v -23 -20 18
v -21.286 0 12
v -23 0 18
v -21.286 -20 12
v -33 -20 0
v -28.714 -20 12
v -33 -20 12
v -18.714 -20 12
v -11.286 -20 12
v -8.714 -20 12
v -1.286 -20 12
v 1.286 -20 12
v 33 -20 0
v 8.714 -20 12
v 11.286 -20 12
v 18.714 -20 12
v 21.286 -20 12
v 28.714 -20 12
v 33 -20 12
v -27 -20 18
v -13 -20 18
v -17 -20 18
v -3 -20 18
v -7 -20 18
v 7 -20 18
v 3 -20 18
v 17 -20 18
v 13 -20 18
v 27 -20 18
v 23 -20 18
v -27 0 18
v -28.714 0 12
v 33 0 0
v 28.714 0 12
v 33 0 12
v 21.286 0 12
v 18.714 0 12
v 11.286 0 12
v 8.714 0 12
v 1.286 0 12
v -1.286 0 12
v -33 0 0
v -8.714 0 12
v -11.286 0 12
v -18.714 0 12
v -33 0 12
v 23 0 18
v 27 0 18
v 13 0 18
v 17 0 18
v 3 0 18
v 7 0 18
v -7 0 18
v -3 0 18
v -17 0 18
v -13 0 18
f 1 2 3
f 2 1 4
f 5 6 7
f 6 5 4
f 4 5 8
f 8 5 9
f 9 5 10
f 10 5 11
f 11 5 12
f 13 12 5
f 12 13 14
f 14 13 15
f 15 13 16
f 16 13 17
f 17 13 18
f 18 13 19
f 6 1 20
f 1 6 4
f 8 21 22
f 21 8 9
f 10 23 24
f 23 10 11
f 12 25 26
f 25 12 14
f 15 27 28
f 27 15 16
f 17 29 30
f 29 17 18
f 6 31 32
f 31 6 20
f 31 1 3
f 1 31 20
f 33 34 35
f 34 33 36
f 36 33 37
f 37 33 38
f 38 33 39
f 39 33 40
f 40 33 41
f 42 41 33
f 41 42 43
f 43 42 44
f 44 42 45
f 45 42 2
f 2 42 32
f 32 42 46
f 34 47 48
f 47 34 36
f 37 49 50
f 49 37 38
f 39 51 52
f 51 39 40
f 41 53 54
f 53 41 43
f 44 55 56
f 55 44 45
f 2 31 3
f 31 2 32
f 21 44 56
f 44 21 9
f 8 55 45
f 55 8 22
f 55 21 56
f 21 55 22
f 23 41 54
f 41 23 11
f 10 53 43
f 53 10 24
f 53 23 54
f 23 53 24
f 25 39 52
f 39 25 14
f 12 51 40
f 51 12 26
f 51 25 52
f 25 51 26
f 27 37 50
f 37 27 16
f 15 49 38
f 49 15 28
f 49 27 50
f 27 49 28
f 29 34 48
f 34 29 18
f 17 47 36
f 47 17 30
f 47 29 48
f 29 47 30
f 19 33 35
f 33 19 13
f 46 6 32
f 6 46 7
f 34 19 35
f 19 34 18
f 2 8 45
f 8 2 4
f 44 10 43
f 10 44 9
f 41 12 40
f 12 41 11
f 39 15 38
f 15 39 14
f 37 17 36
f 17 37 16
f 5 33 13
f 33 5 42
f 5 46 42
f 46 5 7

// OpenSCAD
$fn = 32;

// ----------------------------------------------------------------------
// Toothed rack, 6 teeth
// 10 mm pitch, 6 mm teeth
// ----------------------------------------------------------------------

// --- parameters (mm) ---
bar_w = 20;   // bar width (Y)
bar_h = 12;   // bar height (Z)
teeth = 6;    // number of teeth
pitch = 10;   // tooth pitch
tooth_h = 6;  // tooth height above the bar
root_w = 8;   // tooth width at the root
crest_w = 4;  // tooth width at the crest

// --- derived feature positions (mm) ---
span = (teeth - 1) * pitch;  // = 50   distance between the outer teeth
bar_l = span + root_w + 8;   // = 66   bar length: teeth plus 4 mm at each end
tooth_x = -span / 2;         // = -25   X of the first tooth
height = bar_h + tooth_h;    // = 18   overall height
feature_centers = [
  [tooth_x + 0 * pitch, -bar_w / 2],
  [tooth_x + 1 * pitch, -bar_w / 2],
  [tooth_x + 2 * pitch, -bar_w / 2],
  [tooth_x + 3 * pitch, -bar_w / 2],
  [tooth_x + 4 * pitch, -bar_w / 2],
  [tooth_x + 5 * pitch, -bar_w / 2]
];   // tooth centre line, drives the tooth loop

// bar with a rack of teeth, one extruded trapezoium per centre
module rack_tooth() {
  linear_extrude(height = bar_w)
    polygon(points = [
      [0, 0],
      [root_w, 0],
      [root_w / 2 + crest_w / 2, tooth_h + 1],
      [root_w / 2 - crest_w / 2, tooth_h + 1]
    ]);
}

union() {
  translate([-bar_l / 2, -bar_w, 0]) cube([bar_l, bar_w, bar_h]);
  for (centre = feature_centers)
    translate([centre[0] - root_w / 2, 0, bar_h - 1]) rotate([90, 0, 0]) rack_tooth();
}
